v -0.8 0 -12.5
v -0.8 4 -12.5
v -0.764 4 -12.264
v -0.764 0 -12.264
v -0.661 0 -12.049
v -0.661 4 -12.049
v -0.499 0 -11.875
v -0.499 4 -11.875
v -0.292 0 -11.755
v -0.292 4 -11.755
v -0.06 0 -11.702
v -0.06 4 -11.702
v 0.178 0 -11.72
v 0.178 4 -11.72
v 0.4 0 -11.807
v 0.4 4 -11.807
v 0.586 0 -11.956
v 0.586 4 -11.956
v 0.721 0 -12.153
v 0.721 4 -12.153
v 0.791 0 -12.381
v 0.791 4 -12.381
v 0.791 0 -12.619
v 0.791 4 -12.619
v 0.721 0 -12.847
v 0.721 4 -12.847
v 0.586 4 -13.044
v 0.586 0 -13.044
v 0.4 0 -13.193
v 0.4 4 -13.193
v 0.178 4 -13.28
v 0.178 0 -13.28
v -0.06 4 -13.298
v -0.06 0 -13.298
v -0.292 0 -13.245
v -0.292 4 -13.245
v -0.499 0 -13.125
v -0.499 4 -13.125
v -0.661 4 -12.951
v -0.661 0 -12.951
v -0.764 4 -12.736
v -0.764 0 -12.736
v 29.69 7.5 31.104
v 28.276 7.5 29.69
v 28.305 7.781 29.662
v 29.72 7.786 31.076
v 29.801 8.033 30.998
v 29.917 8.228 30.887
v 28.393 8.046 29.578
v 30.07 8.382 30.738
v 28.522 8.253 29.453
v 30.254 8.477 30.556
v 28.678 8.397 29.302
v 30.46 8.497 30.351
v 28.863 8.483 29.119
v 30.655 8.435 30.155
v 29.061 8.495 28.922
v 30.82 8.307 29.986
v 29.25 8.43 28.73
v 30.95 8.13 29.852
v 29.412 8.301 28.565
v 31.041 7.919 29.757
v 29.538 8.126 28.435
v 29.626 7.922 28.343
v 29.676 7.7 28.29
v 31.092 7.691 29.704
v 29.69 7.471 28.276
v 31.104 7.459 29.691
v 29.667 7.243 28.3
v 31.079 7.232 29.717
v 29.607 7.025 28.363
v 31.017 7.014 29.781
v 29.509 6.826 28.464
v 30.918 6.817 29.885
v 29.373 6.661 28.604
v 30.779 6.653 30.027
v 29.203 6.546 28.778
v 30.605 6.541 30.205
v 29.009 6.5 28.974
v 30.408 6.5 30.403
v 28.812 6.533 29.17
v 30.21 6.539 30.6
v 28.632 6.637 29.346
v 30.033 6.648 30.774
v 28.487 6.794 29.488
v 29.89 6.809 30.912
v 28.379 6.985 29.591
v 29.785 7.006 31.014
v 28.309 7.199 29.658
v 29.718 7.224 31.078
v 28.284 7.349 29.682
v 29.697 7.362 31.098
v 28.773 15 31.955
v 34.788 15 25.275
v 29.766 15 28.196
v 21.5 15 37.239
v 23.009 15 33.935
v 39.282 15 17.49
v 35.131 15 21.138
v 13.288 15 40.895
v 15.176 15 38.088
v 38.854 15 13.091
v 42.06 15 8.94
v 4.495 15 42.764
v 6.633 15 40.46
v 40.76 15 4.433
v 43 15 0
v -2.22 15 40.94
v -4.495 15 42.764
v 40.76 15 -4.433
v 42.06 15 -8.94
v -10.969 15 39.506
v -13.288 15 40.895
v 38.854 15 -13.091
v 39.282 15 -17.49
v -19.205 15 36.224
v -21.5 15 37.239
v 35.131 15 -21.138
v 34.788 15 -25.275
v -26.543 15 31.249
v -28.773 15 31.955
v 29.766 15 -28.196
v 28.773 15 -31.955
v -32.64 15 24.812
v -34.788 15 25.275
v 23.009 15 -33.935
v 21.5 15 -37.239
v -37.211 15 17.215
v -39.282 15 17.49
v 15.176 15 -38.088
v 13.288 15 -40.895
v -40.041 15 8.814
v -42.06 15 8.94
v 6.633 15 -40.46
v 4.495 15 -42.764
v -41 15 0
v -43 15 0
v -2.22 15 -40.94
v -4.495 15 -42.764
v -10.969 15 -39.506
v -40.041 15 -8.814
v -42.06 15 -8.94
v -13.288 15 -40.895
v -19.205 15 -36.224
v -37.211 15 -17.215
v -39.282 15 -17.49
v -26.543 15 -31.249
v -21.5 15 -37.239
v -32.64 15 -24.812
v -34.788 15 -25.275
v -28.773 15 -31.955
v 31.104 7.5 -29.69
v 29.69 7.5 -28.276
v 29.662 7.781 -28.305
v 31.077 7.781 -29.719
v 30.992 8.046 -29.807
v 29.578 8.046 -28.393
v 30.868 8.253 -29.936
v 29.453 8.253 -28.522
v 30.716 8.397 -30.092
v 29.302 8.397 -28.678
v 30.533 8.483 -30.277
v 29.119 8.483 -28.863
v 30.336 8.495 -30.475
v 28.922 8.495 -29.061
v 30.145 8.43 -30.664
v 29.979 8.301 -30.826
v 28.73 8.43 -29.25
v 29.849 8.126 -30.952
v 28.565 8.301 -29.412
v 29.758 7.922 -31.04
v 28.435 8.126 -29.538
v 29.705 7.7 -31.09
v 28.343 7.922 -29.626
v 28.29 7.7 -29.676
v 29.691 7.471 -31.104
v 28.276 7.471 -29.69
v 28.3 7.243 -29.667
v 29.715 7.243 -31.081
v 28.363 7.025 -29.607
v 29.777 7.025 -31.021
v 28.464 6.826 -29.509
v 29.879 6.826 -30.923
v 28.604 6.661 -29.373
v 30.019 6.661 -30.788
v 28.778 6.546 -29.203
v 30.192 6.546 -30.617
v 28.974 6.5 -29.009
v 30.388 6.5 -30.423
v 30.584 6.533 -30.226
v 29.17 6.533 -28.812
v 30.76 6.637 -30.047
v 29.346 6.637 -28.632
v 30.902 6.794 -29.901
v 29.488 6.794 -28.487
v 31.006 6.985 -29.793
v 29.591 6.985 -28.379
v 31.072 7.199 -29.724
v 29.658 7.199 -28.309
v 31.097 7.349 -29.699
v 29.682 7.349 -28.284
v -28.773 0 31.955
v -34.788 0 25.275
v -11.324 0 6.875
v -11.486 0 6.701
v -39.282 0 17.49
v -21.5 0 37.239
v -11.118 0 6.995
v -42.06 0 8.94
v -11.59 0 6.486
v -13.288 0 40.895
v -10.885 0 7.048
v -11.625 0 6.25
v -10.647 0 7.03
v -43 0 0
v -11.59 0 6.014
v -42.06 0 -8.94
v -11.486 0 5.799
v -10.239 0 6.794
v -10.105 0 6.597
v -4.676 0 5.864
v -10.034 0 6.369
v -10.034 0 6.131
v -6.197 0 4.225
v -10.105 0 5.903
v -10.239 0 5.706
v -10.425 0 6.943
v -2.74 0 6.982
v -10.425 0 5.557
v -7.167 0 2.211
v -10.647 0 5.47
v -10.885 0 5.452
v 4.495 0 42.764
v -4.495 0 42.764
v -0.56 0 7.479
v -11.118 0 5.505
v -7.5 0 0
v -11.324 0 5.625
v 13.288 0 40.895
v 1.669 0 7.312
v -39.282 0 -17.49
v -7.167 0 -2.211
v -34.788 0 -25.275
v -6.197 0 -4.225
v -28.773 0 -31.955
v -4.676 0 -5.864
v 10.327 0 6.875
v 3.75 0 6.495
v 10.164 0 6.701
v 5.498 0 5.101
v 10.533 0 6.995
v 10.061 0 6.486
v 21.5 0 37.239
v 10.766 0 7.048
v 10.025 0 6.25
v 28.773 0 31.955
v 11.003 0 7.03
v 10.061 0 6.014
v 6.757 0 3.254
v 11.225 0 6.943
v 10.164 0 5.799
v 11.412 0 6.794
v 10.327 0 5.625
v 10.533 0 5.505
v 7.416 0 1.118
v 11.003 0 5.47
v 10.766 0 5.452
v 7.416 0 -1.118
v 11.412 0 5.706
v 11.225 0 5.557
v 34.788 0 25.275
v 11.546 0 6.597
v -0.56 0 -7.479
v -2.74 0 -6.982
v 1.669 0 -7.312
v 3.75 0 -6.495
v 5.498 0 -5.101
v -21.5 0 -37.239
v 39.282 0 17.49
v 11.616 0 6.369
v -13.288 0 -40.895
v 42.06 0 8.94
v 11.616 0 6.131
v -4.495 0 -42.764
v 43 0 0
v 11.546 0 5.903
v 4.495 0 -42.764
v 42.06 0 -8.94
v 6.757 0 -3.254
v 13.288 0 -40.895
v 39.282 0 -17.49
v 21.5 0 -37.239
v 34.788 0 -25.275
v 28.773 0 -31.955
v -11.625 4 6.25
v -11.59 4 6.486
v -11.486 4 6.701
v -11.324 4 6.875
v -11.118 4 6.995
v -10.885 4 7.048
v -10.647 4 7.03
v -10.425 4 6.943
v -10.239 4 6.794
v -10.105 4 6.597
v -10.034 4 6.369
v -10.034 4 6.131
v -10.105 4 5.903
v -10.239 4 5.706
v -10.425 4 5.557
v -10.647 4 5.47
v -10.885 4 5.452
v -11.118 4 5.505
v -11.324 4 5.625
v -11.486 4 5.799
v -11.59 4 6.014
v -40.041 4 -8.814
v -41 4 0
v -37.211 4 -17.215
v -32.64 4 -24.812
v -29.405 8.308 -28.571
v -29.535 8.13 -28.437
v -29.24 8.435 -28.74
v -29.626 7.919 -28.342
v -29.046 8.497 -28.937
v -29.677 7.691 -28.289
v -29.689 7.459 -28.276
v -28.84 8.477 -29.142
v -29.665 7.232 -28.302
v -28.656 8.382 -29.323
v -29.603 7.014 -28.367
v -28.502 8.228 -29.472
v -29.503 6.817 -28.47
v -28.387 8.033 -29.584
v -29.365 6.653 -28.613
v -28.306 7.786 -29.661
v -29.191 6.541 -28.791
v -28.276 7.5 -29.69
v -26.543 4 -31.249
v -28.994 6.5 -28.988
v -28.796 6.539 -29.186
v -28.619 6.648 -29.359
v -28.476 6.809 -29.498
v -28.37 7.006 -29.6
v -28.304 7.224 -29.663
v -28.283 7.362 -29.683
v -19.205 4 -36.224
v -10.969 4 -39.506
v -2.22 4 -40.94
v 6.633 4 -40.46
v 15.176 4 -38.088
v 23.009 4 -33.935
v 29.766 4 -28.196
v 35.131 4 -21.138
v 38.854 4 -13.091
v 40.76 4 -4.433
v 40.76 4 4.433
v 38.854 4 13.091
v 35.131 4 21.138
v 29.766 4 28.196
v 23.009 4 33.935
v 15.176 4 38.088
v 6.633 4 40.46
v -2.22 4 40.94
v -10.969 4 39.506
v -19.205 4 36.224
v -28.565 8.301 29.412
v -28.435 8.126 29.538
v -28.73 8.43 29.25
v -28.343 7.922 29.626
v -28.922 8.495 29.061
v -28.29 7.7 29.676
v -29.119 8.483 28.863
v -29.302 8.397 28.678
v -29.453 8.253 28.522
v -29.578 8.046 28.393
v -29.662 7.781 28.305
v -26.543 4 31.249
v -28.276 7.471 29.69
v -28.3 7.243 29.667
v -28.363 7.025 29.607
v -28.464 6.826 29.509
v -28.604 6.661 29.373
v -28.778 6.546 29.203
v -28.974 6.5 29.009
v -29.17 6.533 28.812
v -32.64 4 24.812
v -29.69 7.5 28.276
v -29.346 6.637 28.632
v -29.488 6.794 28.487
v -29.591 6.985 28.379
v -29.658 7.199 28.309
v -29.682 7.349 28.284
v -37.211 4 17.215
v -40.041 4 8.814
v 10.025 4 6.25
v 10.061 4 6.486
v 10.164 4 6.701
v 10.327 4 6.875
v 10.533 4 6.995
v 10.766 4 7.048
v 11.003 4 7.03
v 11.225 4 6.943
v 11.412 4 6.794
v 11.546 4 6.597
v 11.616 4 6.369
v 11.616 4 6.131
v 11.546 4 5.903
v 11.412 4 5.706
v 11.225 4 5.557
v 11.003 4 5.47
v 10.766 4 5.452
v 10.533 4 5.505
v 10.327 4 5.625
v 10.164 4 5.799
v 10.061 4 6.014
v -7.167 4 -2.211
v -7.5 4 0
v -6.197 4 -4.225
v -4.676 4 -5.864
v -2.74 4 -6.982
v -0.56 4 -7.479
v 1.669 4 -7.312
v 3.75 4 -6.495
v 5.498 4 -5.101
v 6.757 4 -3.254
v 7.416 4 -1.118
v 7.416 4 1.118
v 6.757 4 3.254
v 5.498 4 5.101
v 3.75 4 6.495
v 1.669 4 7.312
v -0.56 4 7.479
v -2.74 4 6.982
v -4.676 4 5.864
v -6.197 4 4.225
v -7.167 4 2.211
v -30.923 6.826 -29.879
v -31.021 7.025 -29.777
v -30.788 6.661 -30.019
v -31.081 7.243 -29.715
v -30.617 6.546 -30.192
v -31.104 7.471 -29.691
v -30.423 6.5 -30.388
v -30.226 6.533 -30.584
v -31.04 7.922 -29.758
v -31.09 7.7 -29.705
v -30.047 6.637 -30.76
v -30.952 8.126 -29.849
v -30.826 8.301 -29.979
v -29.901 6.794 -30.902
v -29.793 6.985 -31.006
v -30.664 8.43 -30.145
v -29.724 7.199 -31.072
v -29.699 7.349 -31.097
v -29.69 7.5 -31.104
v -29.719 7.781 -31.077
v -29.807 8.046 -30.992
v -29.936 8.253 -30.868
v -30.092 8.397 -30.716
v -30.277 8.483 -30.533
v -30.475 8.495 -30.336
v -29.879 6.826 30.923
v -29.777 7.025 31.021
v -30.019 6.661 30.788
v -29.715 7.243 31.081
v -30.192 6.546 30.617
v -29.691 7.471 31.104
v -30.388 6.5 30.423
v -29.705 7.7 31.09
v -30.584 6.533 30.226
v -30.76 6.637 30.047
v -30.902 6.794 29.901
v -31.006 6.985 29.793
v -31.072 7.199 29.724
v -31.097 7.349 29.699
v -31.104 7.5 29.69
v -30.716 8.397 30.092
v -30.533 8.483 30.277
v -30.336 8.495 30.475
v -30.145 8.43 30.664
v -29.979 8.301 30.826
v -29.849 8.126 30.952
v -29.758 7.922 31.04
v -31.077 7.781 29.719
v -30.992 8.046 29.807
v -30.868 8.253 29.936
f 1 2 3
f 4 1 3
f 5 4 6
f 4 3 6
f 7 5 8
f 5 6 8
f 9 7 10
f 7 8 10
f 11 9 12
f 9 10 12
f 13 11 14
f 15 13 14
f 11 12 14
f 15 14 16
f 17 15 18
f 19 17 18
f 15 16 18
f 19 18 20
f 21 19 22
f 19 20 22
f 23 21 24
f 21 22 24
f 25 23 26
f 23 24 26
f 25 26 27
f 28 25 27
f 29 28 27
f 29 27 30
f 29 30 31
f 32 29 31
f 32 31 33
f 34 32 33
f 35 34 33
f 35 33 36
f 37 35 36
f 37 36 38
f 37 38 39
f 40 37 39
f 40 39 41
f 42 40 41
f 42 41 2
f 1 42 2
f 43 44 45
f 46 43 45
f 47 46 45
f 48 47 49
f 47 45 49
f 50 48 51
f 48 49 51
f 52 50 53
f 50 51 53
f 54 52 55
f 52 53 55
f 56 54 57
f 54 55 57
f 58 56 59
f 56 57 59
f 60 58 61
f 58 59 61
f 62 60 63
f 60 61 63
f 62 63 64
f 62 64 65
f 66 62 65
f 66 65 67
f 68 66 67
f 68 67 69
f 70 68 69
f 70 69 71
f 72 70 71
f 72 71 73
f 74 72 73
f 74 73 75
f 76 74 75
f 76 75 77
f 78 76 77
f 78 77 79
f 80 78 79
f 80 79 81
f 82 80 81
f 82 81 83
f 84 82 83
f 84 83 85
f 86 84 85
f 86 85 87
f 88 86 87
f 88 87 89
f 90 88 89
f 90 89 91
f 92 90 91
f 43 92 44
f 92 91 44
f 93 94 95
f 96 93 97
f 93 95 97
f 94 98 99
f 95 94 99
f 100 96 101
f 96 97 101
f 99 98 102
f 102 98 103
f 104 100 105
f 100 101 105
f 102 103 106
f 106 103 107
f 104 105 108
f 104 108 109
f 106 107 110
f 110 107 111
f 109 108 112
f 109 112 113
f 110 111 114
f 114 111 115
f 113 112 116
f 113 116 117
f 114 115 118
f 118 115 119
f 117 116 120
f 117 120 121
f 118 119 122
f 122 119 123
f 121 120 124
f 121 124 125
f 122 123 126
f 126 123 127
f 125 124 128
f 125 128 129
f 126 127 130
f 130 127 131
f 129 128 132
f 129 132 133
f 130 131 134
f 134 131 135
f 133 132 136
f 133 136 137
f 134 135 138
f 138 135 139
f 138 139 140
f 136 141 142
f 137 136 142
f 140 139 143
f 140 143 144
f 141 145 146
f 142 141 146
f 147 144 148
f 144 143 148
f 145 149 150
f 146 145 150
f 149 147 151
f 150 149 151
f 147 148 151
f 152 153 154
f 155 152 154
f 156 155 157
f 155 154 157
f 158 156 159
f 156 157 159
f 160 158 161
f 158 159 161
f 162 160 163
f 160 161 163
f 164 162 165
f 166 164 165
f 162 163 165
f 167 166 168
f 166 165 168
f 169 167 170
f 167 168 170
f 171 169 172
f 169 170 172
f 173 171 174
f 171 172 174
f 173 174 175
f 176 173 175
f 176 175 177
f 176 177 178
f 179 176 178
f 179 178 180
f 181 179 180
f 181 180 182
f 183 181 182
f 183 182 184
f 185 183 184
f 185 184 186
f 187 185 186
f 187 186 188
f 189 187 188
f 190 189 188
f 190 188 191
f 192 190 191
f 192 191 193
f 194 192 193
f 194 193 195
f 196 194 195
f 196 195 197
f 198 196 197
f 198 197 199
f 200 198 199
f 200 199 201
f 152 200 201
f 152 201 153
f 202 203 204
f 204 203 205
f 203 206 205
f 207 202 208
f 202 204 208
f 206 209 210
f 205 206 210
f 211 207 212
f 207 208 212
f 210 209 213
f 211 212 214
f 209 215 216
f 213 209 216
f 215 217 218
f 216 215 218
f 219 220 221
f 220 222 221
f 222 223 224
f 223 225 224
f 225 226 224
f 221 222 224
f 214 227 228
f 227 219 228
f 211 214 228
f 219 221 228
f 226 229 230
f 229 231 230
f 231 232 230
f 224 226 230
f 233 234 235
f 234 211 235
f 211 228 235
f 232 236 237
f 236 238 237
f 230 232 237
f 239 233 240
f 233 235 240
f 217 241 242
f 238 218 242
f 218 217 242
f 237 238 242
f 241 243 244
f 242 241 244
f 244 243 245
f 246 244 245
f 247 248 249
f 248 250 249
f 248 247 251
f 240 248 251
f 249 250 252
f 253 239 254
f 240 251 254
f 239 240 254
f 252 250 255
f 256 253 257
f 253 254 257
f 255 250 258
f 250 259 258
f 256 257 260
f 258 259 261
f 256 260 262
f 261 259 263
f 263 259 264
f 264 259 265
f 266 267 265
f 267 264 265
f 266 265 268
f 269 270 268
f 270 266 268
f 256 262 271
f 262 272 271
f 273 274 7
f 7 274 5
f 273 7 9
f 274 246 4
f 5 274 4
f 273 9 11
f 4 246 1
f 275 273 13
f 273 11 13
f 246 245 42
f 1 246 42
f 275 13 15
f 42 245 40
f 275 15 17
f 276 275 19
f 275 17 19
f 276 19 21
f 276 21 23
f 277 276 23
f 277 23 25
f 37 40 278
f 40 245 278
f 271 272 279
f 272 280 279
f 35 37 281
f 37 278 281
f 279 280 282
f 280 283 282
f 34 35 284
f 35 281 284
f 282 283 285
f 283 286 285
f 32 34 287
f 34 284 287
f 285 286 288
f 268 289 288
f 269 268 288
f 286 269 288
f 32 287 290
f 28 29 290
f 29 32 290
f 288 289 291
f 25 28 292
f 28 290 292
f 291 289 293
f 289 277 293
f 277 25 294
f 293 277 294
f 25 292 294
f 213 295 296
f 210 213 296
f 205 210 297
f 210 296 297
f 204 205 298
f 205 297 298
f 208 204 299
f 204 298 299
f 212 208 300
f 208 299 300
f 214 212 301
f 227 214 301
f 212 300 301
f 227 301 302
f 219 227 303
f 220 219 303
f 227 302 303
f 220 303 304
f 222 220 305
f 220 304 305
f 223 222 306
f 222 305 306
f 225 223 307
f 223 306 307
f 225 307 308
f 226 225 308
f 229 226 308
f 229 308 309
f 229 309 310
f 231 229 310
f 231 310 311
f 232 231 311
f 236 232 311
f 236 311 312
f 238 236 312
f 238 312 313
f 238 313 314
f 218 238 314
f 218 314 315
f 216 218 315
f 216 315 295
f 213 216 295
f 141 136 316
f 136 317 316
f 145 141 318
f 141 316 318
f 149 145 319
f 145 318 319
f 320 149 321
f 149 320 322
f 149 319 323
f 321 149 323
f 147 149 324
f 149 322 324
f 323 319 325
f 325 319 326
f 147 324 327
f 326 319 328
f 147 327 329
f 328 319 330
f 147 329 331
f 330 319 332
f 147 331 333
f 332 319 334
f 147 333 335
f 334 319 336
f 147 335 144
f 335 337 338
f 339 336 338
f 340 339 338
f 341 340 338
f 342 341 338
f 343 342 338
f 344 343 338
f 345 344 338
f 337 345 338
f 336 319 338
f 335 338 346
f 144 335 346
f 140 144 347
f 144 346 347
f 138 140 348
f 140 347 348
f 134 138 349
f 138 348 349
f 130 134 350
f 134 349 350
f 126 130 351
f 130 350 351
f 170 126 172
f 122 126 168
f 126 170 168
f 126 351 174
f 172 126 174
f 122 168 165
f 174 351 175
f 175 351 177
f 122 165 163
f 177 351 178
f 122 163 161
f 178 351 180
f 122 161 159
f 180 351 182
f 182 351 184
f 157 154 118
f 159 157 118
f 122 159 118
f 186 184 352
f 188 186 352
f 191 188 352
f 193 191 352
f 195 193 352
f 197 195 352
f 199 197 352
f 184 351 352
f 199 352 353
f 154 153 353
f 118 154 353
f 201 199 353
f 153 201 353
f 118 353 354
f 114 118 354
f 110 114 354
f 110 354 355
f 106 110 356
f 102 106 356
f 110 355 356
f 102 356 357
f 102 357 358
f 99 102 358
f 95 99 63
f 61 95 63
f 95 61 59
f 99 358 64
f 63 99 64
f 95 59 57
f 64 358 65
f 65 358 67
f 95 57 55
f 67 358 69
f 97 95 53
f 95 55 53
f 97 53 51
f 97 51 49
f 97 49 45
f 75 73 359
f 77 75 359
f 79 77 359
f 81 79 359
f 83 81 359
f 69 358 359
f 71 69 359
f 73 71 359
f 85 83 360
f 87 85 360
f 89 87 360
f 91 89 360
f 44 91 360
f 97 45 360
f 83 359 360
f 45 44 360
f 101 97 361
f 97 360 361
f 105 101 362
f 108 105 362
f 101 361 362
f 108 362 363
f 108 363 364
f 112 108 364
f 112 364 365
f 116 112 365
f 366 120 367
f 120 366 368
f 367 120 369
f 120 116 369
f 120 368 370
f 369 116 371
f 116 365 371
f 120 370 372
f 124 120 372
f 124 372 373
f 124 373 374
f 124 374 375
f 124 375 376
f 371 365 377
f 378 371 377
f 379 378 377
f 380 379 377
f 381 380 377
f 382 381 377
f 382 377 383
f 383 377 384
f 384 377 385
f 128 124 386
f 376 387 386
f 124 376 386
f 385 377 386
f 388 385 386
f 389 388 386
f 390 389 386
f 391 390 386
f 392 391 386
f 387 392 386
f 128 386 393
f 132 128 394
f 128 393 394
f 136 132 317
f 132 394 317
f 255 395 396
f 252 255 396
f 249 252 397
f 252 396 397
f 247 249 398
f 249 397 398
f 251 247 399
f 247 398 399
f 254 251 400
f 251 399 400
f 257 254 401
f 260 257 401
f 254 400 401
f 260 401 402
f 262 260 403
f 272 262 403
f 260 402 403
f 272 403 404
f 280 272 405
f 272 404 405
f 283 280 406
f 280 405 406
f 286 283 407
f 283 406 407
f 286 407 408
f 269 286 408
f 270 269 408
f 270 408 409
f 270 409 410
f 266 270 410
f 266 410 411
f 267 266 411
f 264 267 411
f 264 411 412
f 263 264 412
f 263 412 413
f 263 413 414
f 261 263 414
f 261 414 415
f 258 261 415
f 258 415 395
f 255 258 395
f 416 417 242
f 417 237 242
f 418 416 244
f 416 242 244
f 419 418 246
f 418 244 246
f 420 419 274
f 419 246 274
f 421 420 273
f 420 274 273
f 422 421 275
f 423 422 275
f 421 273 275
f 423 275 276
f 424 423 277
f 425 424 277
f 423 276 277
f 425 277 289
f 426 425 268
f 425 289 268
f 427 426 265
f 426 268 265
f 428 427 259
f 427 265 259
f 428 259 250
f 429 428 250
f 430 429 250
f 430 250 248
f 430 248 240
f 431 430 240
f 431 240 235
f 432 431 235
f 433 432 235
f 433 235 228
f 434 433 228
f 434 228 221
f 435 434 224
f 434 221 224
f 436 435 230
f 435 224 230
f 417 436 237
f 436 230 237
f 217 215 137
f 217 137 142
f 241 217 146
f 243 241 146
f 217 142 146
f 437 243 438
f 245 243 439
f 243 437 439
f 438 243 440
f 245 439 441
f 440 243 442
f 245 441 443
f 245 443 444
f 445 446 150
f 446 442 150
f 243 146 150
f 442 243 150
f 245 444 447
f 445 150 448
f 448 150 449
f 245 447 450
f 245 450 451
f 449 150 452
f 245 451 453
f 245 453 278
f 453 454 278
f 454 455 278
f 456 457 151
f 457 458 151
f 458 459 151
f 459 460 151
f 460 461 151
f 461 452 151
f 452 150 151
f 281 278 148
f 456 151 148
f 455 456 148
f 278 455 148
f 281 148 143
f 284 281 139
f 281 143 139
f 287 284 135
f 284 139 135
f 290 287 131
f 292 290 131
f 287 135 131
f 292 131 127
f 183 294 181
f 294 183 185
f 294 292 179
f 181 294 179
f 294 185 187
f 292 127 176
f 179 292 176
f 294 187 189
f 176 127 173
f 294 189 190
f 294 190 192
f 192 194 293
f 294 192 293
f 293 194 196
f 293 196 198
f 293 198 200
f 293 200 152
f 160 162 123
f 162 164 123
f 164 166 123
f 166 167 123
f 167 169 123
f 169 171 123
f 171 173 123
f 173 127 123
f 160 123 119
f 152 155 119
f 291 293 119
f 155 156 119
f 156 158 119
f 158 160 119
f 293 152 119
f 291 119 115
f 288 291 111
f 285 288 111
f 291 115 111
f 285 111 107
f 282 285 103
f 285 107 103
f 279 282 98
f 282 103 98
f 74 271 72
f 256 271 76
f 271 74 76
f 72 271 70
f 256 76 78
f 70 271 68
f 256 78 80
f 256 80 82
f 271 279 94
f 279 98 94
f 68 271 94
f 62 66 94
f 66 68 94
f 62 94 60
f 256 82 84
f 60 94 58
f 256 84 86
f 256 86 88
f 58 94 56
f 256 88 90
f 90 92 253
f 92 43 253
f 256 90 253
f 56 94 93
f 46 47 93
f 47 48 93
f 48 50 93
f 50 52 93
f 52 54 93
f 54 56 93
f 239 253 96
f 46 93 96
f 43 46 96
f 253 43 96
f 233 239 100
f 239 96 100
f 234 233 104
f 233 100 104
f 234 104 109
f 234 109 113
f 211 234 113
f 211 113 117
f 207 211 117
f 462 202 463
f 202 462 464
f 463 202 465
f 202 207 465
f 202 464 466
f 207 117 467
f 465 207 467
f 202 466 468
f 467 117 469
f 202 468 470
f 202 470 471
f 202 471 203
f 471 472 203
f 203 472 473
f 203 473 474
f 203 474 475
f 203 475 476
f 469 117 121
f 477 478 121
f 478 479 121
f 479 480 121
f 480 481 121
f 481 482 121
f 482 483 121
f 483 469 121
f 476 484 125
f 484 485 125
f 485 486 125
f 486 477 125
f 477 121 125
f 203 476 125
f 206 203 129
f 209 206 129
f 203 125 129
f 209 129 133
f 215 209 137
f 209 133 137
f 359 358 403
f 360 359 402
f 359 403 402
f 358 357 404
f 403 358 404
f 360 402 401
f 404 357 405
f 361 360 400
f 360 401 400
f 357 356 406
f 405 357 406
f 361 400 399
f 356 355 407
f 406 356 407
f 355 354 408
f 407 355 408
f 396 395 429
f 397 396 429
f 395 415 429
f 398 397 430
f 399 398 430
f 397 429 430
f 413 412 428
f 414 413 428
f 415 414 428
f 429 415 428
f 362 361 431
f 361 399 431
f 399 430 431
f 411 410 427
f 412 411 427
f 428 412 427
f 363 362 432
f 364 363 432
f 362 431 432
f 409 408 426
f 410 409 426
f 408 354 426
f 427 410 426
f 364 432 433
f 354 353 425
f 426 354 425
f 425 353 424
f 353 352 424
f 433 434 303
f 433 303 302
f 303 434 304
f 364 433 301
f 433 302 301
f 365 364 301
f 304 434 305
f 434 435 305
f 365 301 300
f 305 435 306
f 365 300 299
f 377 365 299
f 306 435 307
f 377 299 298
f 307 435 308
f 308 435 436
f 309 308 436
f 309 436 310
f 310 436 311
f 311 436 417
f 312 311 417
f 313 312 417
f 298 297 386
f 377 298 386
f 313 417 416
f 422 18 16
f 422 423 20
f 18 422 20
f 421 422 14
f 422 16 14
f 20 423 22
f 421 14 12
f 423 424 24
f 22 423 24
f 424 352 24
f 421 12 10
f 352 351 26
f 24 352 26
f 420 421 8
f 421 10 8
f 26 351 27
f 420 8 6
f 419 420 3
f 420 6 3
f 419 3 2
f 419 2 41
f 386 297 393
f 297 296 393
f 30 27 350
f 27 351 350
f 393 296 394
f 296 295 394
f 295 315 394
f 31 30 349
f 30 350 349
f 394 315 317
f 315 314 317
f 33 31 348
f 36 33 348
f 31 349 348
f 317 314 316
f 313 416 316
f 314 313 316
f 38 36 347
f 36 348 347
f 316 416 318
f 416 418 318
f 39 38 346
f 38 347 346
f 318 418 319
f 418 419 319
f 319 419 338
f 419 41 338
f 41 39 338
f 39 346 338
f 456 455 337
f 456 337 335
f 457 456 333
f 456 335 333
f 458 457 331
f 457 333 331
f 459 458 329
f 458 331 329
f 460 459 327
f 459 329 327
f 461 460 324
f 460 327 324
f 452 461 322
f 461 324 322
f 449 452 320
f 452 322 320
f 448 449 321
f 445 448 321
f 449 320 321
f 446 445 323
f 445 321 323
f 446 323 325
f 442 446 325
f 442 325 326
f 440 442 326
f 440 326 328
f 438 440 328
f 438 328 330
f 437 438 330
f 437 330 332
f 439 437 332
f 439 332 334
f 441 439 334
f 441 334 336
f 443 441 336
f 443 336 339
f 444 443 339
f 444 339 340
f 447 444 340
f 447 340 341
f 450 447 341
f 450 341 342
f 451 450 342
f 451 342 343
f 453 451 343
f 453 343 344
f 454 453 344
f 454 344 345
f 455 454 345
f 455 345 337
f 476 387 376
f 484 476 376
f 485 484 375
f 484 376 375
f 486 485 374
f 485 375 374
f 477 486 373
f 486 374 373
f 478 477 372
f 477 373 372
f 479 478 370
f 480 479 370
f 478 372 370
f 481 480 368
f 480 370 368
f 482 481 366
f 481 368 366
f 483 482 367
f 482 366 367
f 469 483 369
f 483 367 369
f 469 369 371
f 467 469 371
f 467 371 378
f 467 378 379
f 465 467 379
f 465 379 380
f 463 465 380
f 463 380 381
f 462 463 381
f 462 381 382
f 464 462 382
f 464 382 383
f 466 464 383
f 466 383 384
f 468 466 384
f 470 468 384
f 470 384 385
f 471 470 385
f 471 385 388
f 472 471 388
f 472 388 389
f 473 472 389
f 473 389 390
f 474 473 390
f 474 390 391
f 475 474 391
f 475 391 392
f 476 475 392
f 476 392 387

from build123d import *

# Parameters (mm, degrees)
SKETCH2_R          = 0.8
CUT_EXTRUDE1_DEPTH = 62.798058222
SKETCH3_R          = 1
CUT_EXTRUDE2_DEPTH = 63.633856659
CIRPATTERN1_COUNT  = 4


with BuildPart() as part:
    # Sketch1 → Revolve1 (revolve)
    with BuildSketch(Plane.XY, mode=Mode.PRIVATE) as revolve1_sk:
        Polygon((7.5, 4), (7.5, 0), (43, 0), (43, 15), (41, 15), (41, 4), align=None)
    revolve(revolve1_sk.sketch.rotate(Axis((0, 4, 0), (0, -1, 0)), 180), axis=Axis((0, 4, 0), (0, -1, 0)))

    # Sketch2 → Cut-Extrude1 (cut, through all)
    with BuildSketch(Plane(origin=(0, 4, 0), x_dir=(1, 0, 0), z_dir=(0, 1, 0))):
        with Locations(Location((0, 12.5, 0), (0, 0, 180))):
            Circle(SKETCH2_R)
        with Locations(Location((10.825317547, -6.25, 0), (0, 0, 180))):
            Circle(SKETCH2_R)
        with Locations(Location((-10.825317547, -6.25, 0), (0, 0, 180))):
            Circle(SKETCH2_R)
    extrude(amount=-CUT_EXTRUDE1_DEPTH, mode=Mode.SUBTRACT)

    # Sketch3 → Cut-Extrude2 (cut, through all)
    with BuildSketch(Plane(origin=(0, 0, 0), x_dir=(0.7071067811865464, 0, 0.7071067811865488), z_dir=(-0.7071067811865488, 0, 0.7071067811865464))):
        with Locations((0, 7.5)):
            Circle(SKETCH3_R)
    cut_extrude2 = extrude(amount=-CUT_EXTRUDE2_DEPTH, mode=Mode.SUBTRACT)

    # CirPattern1: Cut-Extrude2 ×4 about axis
    cirpattern1_axis = Axis((0, 4, 0), (0, 1, 0))
    for i in range(1, CIRPATTERN1_COUNT):
        add(cut_extrude2.rotate(cirpattern1_axis, i * 360 / CIRPATTERN1_COUNT), mode=Mode.SUBTRACT)


solid = part.part
